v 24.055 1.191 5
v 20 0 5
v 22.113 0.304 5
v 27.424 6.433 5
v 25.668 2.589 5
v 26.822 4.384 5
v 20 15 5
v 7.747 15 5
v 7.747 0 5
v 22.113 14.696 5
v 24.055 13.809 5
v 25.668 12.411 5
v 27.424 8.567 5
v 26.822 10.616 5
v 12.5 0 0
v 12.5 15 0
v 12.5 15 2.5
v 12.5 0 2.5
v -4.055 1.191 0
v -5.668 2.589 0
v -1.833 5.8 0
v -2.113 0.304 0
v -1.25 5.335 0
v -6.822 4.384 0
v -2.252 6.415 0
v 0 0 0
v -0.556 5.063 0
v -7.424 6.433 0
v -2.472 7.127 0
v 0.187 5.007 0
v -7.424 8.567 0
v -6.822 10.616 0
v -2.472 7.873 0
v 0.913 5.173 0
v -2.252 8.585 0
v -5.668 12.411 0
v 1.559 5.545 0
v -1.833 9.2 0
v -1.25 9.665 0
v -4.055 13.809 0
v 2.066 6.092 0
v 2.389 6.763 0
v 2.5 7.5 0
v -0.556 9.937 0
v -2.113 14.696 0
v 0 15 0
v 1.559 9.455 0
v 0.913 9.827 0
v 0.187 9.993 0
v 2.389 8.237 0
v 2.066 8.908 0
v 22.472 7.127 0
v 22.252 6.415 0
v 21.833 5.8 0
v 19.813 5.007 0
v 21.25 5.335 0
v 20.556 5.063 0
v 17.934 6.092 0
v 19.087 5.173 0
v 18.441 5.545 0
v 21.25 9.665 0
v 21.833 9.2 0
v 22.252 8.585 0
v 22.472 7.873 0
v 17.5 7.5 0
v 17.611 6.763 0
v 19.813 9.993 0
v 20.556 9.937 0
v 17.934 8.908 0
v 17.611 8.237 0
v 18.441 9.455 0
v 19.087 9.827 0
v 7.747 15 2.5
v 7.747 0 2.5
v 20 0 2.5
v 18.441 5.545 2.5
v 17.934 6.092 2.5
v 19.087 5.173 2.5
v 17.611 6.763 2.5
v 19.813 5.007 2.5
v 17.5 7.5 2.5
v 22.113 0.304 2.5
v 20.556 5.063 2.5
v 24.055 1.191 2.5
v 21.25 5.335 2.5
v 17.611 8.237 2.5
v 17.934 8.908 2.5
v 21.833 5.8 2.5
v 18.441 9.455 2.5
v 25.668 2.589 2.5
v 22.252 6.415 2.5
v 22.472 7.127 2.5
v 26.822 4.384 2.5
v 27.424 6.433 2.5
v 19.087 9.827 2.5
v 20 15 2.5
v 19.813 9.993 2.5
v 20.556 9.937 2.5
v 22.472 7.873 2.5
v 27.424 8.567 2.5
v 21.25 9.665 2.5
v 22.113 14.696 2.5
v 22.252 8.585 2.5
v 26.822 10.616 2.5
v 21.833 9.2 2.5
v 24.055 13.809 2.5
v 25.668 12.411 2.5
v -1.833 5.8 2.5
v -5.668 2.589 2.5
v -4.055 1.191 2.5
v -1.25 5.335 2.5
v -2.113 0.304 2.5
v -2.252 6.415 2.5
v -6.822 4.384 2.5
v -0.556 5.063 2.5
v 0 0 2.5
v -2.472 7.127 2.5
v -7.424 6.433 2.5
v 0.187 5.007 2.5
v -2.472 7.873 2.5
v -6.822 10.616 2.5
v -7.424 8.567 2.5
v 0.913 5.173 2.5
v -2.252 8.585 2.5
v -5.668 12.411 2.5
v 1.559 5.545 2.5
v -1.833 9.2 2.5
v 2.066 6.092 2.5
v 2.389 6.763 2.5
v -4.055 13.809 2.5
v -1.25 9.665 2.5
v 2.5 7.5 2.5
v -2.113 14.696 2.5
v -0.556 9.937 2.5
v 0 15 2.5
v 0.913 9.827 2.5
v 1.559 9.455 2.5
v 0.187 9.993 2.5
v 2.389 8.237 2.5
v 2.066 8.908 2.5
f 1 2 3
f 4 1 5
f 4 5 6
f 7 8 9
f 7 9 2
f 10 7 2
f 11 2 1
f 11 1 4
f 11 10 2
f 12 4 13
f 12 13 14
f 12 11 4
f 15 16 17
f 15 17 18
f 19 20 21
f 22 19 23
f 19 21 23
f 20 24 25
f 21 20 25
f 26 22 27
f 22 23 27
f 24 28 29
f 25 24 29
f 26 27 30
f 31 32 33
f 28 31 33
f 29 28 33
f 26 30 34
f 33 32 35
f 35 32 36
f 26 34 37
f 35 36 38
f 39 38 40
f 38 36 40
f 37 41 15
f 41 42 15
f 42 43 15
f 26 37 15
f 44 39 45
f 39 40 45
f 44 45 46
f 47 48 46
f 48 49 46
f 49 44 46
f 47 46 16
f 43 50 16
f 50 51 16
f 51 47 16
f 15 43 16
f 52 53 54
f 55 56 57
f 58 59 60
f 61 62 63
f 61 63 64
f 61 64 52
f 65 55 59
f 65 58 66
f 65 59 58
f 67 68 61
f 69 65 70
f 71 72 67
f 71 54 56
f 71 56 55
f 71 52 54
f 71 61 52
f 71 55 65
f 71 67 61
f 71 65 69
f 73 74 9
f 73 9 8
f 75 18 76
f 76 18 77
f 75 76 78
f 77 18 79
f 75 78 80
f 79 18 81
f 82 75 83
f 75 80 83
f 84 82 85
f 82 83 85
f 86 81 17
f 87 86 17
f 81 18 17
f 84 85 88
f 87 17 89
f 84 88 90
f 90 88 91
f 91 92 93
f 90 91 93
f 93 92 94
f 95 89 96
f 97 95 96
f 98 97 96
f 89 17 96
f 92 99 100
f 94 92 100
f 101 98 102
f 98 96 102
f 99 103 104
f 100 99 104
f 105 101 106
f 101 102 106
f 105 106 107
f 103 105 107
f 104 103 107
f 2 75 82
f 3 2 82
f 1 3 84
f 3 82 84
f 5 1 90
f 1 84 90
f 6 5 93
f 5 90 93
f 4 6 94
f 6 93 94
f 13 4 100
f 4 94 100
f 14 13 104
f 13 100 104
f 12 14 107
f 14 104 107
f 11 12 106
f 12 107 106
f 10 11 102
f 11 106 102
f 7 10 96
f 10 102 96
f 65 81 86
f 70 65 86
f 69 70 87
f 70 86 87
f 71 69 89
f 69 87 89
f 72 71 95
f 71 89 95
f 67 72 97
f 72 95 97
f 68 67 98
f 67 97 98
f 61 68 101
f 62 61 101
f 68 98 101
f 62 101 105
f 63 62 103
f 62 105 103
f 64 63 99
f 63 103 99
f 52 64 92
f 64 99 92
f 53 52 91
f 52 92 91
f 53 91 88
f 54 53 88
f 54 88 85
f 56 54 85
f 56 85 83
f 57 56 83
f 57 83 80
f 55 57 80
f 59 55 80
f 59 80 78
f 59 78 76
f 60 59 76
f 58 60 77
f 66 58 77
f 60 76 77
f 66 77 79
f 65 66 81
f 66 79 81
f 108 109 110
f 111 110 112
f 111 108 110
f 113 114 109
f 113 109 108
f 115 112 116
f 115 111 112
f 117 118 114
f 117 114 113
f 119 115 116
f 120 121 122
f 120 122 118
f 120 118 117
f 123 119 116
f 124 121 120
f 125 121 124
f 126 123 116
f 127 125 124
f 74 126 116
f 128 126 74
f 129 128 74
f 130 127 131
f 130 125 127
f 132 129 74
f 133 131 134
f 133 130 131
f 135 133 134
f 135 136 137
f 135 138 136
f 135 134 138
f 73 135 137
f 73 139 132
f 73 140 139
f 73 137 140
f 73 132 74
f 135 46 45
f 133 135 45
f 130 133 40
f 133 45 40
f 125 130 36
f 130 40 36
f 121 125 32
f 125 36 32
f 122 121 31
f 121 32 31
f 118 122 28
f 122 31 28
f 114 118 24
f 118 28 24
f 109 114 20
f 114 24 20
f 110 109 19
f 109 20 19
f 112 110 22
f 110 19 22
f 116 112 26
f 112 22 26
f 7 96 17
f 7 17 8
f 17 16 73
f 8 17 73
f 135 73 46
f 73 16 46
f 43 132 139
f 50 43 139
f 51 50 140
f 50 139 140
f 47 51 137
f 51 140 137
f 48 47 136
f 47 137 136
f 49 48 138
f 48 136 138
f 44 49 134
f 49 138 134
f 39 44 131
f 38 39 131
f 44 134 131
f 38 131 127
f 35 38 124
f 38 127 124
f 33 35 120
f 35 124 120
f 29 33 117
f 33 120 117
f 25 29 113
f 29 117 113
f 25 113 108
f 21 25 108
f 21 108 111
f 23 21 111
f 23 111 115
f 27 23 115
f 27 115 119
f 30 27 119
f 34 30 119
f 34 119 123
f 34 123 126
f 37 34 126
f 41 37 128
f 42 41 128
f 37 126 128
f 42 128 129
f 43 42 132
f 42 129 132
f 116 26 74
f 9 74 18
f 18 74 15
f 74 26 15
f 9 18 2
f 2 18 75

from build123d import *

# Parameters (mm, degrees)
BOSS_EXTRUDE1_DEPTH = 5
CUT_EXTRUDE2_DEPTH  = 2.5
CUT_EXTRUDE6_START  = -2.5
CUT_EXTRUDE6_DEPTH  = 2.5
SKETCH11_R          = 2.5
CUT_EXTRUDE7_DEPTH  = 2.5
SKETCH12_R          = 2.5
BOSS_EXTRUDE3_DEPTH = 2.5


with BuildPart() as part:
    # Sketch1 → Boss-Extrude1 (new body)
    with BuildSketch(Plane.XY):
        with BuildLine():
            ThreePointArc((-3.422374857, 0.826369029), (-1.760364695, 0.209518799), (0, 0))
            Line((0, 0), (20, 0))
            ThreePointArc((20, 0), (27.5, 7.5), (20, 15))
            Line((20, 15), (0, 15))
            ThreePointArc((0, 15), (-7.290481201, 9.260364695), (-3.422374857, 0.826369029))
        make_face()
    extrude(amount=BOSS_EXTRUDE1_DEPTH)

    # Sketch6 → Cut-Extrude2 (cut)
    with BuildSketch(Plane(origin=(0, 0, 0), x_dir=(-1, 0, 0), z_dir=(0, 0, -1))):
        with BuildLine():
            Line((-20, 15), (-12.5, 15))
            Line((-12.5, 15), (-12.5, 0))
            Line((-12.5, 0), (-20, 0))
            ThreePointArc((-20, 0), (-27.5, 7.5), (-20, 15))
        make_face()
    extrude(amount=-CUT_EXTRUDE2_DEPTH, mode=Mode.SUBTRACT)

    # Sketch7 → Cut-Extrude6 (cut)
    with BuildSketch(Plane.XY.offset(5).offset(CUT_EXTRUDE6_START)):
        with BuildLine():
            Line((7.746832871, 15), (0, 15))
            ThreePointArc((0, 15), (-7.5, 7.5), (0, 0))
            Line((0, 0), (5, 0))
            Line((5, 0), (7.746832871, 0))
            Line((7.746832871, 0), (7.746832871, 15))
        make_face()
    extrude(amount=CUT_EXTRUDE6_DEPTH, mode=Mode.SUBTRACT)

    # Sketch11 → Cut-Extrude7 (cut)
    with BuildSketch(Plane.XY.offset(2.5)):
        with Locations((0, 7.5)):
            Circle(SKETCH11_R)
    extrude(amount=-CUT_EXTRUDE7_DEPTH, mode=Mode.SUBTRACT)

    # Sketch12 → Boss-Extrude3 (add)
    with BuildSketch(Plane(origin=(0, 0, 2.5), x_dir=(-1, 0, 0), z_dir=(0, 0, -1))):
        with Locations((-20, 7.5)):
            Circle(SKETCH12_R)
    extrude(amount=BOSS_EXTRUDE3_DEPTH)


solid = part.part
